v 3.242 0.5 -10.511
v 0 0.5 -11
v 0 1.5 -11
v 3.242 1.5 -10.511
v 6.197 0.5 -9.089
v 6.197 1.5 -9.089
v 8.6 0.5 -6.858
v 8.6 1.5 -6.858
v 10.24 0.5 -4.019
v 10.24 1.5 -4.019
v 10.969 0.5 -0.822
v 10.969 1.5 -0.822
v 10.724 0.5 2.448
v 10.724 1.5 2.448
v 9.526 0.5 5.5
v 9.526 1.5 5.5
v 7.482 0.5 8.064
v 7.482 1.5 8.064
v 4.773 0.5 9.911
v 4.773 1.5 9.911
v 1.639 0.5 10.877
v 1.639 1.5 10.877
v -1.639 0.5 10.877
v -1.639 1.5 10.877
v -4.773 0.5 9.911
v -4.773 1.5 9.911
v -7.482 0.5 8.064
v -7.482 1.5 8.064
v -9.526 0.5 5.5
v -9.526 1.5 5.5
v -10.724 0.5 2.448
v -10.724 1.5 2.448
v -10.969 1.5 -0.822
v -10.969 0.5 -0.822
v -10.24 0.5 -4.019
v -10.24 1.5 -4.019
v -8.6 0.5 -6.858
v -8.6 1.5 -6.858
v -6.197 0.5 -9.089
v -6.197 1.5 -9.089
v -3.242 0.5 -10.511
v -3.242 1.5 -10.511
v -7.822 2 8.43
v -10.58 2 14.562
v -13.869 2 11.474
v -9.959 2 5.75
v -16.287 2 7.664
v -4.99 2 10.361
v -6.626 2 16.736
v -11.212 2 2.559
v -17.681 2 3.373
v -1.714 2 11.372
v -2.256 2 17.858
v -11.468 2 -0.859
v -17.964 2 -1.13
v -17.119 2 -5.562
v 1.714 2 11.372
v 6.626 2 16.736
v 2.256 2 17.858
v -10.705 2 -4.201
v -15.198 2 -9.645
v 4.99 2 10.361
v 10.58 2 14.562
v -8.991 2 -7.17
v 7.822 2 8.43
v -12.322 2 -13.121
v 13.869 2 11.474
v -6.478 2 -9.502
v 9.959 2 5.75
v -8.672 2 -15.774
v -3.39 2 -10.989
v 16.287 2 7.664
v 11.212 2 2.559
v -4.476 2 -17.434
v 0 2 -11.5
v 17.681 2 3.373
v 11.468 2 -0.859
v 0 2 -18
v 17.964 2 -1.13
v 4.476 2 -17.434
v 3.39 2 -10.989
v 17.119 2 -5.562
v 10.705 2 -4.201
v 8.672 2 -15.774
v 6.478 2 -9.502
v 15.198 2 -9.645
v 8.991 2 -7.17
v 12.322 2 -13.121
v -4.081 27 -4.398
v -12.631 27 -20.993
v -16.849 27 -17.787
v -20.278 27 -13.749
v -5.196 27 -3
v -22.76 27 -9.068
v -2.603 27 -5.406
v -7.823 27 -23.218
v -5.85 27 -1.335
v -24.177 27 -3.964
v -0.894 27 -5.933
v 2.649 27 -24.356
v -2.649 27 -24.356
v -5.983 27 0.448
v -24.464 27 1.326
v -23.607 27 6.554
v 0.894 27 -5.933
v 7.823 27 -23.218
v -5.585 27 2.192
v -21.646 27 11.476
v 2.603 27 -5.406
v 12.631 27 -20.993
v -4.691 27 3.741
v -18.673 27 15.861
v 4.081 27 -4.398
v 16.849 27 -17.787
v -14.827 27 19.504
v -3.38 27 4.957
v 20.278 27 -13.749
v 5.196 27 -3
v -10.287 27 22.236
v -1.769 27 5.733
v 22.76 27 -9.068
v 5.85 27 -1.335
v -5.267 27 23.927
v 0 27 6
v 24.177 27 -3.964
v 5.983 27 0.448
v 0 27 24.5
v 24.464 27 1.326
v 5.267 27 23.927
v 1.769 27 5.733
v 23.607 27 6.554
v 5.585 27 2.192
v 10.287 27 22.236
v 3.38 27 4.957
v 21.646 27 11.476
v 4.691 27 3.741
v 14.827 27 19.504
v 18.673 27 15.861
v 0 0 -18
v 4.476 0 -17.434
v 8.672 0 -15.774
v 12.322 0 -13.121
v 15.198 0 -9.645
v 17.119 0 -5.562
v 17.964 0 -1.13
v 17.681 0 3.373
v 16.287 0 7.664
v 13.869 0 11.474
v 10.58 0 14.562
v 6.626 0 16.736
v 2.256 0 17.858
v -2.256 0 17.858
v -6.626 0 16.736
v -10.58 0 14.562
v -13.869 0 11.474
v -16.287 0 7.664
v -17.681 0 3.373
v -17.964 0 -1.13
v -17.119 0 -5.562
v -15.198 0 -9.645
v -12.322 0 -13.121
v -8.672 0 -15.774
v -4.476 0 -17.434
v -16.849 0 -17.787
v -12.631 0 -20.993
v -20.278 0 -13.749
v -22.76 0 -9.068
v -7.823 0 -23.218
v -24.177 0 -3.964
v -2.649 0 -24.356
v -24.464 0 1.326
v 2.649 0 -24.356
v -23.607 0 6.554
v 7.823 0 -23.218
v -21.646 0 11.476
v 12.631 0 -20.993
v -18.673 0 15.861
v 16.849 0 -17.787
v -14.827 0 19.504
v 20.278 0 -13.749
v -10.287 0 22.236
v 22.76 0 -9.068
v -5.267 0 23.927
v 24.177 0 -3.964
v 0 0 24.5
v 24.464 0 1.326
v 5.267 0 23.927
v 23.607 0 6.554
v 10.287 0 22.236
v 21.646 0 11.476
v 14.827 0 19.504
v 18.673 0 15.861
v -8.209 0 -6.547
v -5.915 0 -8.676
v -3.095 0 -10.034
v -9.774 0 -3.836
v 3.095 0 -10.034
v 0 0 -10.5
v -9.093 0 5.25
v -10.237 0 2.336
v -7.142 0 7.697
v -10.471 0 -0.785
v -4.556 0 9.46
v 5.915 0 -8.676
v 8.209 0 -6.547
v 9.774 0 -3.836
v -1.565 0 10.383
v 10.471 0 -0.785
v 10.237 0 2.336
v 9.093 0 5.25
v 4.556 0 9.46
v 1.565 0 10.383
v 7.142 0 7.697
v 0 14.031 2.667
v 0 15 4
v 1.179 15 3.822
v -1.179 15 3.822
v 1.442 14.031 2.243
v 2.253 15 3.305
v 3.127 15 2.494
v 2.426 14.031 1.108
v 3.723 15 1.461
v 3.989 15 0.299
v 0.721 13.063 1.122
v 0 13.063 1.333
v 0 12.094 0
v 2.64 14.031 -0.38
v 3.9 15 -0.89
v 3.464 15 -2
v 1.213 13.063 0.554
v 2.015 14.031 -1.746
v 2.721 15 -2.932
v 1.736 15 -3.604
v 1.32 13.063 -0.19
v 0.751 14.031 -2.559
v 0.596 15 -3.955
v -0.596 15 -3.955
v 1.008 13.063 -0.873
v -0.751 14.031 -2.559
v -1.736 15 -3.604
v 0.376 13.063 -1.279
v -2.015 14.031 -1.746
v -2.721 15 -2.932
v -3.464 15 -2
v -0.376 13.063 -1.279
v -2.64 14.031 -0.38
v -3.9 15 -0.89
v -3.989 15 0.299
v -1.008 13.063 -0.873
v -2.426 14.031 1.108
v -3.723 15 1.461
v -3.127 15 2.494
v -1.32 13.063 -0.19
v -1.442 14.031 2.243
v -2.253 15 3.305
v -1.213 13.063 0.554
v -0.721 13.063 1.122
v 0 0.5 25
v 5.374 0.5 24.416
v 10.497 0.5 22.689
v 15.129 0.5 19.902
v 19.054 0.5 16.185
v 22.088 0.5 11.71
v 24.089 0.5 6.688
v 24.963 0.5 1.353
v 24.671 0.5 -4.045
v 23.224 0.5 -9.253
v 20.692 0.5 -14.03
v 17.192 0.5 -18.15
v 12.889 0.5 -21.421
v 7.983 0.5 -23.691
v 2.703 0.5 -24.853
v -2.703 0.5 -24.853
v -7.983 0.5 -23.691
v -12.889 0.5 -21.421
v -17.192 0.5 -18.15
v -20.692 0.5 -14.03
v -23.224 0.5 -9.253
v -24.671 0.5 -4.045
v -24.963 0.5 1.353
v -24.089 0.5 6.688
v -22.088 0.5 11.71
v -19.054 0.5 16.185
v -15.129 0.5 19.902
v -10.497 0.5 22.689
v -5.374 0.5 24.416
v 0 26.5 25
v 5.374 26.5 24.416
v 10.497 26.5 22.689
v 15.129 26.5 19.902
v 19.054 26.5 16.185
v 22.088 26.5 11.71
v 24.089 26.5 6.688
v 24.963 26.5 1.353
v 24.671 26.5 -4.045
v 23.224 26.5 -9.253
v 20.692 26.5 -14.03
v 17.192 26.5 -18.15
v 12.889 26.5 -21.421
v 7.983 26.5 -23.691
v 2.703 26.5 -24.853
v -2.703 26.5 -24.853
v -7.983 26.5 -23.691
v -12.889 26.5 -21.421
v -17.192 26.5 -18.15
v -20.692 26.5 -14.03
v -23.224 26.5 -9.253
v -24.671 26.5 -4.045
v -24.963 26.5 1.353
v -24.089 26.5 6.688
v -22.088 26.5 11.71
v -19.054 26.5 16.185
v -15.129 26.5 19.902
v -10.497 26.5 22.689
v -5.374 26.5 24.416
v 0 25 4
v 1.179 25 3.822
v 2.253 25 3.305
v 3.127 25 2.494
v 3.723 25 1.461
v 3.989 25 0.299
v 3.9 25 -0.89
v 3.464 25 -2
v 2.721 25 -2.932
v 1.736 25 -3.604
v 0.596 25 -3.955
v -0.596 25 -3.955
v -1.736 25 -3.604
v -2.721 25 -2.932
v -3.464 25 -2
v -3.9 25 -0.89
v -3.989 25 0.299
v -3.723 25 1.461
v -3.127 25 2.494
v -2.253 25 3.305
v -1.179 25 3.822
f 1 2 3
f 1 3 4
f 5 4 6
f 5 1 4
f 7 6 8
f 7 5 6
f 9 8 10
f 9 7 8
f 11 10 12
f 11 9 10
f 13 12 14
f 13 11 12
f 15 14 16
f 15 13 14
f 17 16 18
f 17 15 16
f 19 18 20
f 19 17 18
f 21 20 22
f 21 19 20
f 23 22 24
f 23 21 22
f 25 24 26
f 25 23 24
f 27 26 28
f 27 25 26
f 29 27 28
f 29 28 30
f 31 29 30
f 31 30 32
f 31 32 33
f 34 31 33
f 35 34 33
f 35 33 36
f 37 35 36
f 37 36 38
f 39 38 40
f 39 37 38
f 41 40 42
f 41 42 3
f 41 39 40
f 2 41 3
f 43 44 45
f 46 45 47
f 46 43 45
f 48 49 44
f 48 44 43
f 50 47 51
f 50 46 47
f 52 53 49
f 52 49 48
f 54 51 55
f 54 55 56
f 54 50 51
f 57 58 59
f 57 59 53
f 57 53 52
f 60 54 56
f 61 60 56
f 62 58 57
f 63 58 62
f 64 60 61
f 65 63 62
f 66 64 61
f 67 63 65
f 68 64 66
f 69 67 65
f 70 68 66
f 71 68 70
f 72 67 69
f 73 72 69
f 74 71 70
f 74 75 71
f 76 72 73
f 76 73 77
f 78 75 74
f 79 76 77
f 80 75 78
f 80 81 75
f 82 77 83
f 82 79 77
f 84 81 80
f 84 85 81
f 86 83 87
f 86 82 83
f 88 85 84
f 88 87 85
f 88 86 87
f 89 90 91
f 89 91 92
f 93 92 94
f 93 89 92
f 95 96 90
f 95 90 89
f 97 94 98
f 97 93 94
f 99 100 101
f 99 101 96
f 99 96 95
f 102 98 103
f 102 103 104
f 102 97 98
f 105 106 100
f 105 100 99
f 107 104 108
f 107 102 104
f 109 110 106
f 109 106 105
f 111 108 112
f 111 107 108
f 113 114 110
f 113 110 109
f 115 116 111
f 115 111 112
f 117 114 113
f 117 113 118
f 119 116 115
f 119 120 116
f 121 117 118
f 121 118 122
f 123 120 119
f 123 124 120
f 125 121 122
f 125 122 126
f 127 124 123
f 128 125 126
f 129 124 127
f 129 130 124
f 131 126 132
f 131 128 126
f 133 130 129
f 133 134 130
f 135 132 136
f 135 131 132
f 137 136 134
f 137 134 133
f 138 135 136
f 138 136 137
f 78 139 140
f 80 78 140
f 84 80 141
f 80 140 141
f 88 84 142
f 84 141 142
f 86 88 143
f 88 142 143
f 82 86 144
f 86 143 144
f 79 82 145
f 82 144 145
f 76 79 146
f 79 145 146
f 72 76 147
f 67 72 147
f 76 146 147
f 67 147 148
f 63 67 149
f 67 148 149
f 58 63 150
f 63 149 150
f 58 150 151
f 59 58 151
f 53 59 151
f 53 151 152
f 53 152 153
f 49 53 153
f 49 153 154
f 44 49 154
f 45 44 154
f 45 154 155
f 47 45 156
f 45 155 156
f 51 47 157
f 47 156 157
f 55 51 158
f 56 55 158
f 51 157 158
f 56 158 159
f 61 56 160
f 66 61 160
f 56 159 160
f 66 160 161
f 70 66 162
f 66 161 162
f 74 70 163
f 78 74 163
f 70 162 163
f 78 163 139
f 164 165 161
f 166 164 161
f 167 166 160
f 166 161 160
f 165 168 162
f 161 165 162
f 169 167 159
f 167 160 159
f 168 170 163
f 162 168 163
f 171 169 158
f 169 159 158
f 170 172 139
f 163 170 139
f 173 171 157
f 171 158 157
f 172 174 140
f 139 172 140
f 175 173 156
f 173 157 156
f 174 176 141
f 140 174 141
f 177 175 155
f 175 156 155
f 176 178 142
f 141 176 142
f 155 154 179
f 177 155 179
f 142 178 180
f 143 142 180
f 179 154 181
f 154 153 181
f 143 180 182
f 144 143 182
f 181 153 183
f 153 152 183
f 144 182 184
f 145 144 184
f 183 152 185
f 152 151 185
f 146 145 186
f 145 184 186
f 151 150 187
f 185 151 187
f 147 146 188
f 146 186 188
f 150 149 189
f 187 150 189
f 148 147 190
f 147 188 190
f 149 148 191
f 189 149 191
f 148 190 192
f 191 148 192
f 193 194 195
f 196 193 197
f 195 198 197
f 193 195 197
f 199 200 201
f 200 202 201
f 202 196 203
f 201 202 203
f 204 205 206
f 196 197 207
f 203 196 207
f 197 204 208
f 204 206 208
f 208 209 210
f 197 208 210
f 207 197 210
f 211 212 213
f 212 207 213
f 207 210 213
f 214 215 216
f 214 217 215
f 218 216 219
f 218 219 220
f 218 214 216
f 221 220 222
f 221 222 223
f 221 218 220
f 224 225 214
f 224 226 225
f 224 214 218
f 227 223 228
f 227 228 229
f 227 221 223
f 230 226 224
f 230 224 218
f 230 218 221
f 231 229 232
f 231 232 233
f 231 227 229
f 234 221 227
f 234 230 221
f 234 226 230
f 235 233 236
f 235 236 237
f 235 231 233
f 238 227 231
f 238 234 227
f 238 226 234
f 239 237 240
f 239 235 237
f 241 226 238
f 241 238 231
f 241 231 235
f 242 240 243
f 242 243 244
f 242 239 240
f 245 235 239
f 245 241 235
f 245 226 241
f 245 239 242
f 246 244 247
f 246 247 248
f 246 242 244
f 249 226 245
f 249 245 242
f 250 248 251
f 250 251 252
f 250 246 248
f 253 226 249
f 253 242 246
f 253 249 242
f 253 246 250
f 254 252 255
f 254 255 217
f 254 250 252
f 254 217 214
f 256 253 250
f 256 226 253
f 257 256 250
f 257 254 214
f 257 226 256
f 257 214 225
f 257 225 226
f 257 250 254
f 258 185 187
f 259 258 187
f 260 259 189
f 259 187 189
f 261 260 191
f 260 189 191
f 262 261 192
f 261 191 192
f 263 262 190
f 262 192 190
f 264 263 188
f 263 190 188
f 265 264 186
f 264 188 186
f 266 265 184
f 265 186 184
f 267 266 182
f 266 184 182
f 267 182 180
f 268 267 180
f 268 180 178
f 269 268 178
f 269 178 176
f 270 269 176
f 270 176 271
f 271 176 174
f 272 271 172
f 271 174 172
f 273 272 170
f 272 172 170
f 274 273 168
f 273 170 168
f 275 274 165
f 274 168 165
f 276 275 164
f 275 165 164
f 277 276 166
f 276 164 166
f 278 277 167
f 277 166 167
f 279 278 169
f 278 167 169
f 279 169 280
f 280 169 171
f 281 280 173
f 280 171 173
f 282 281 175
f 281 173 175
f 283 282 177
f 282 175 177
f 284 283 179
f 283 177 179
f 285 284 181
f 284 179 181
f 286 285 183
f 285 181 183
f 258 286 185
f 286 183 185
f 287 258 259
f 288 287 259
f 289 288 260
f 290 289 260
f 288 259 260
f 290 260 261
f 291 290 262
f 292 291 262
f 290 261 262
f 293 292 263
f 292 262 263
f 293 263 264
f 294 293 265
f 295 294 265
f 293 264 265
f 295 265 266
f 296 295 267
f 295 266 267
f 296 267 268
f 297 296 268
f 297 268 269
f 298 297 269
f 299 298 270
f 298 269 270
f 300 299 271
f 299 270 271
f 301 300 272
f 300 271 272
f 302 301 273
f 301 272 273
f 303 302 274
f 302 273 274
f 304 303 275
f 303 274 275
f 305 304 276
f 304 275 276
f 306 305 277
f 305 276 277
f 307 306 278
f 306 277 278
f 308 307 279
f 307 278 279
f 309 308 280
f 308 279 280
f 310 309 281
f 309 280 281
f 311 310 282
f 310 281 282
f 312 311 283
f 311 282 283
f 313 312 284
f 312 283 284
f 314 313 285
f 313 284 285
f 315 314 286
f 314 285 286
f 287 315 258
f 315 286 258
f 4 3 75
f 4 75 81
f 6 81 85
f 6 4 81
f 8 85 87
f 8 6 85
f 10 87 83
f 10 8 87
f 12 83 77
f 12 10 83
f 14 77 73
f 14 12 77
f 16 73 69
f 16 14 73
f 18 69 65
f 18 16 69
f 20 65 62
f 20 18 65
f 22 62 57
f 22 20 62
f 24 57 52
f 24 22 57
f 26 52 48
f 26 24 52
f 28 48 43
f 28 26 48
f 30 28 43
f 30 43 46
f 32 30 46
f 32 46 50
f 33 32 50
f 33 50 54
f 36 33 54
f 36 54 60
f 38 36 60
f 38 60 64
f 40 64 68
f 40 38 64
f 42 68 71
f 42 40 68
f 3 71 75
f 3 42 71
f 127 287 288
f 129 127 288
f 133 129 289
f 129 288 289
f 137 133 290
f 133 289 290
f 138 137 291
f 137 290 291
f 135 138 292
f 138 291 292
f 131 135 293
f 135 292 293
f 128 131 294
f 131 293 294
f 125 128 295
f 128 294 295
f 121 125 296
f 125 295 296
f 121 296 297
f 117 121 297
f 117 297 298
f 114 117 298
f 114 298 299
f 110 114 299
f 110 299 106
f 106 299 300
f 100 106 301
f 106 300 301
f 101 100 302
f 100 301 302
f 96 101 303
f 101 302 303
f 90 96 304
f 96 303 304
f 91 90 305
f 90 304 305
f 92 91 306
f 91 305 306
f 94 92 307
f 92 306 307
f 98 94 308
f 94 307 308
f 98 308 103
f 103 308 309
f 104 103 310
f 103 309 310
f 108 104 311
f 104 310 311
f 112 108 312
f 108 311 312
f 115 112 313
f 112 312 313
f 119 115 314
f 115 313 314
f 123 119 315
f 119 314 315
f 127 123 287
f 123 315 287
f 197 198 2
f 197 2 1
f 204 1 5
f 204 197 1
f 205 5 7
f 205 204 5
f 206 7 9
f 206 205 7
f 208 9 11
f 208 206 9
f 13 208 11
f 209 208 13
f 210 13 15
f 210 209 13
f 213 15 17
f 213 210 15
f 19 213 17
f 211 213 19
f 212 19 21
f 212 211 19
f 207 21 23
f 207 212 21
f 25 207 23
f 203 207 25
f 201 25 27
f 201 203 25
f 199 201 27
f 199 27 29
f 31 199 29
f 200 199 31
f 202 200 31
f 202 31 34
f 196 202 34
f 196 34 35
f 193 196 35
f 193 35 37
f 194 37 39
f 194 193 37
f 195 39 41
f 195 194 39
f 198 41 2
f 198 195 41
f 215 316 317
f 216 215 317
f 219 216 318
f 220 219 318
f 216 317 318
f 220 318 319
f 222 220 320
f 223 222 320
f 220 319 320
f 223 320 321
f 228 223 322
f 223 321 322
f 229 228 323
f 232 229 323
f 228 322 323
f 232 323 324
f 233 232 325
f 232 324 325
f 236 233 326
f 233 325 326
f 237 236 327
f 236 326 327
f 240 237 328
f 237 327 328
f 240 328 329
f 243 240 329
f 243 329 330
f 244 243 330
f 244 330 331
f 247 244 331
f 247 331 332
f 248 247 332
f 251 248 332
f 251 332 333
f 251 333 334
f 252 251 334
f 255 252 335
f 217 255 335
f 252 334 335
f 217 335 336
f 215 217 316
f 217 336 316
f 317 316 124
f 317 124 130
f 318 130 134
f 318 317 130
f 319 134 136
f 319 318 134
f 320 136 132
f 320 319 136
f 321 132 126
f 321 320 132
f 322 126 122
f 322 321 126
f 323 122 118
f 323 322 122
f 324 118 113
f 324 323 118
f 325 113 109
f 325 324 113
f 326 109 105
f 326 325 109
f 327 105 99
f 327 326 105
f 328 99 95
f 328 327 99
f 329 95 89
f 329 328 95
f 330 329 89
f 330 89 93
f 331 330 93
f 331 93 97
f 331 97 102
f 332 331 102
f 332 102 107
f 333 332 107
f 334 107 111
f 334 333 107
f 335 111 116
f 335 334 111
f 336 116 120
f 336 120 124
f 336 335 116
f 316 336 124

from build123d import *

# Parameters (mm, degrees)
SKETCH_1_R          = 25
EXTRUDE_1_DEPTH     = 27
SKETCH_9_R          = 4
CUT_EXTRUDE_1_DEPTH = 12
CHAMFER_1_SIZE      = 2
CHAMFER_2_SIZE      = 0.5
SKETCH_11_R         = 18
SKETCH_11_R_2       = 11
CUT_EXTRUDE_2_DEPTH = 2
CHAMFER_3_SIZE      = 0.5


with BuildPart() as part:
    # 草图1 → 凸台-拉伸1 (new body)
    with BuildSketch(Plane(origin=(0, 0, 0), x_dir=(1, 0, 0), z_dir=(0, 1, 0))):
        with Locations(Location((0, 0, 0), (0, 0, 270))):
            Circle(SKETCH_1_R)
    extrude(amount=EXTRUDE_1_DEPTH)

    # 草图9 → 切除-拉伸1 (cut)
    with BuildSketch(Plane(origin=(0, 27, 0), x_dir=(1, 0, 0), z_dir=(0, 1, 0))):
        with Locations(Location((0, 0, 0), (0, 0, 270))):
            Circle(SKETCH_9_R)
    extrude(amount=-CUT_EXTRUDE_1_DEPTH, mode=Mode.SUBTRACT)

    # 草图10 → 切除-旋转2 (revolve, cut)
    with BuildSketch(Plane.XY, mode=Mode.PRIVATE) as cut_revolve_2_sk:
        Polygon((-4, 15), (0, 12.093829888), (0, 15), align=None)
    revolve(cut_revolve_2_sk.sketch.rotate(Axis((0, 12.093829888, 0), (0, 1, 0)), 90), axis=Axis((0, 12.093829888, 0), (0, 1, 0)), mode=Mode.SUBTRACT)

    # 倒角1
    chamfer_1_edges = [part.edges().sort_by_distance(p)[0] for p in [
        (0, 27, -4),
    ]]
    chamfer(chamfer_1_edges, length=CHAMFER_1_SIZE)

    # 倒角2
    chamfer_2_edges = [part.edges().sort_by_distance(p)[0] for p in [
        (0, 0, -25),
        (0, 27, -25),
    ]]
    chamfer(chamfer_2_edges, length=CHAMFER_2_SIZE)

    # 草图11 → 切除-拉伸2 (cut)
    with BuildSketch(Plane.XZ):
        with Locations(Location((0, 0, 0), (0, 0, 270))):
            Circle(SKETCH_11_R)
        with Locations(Location((0, 0, 0), (0, 0, 270))):
            Circle(SKETCH_11_R_2, mode=Mode.SUBTRACT)
    extrude(amount=-CUT_EXTRUDE_2_DEPTH, mode=Mode.SUBTRACT)

    # 倒角3
    chamfer_3_edges = [part.edges().sort_by_distance(p)[0] for p in [
        (0, 2, 11),
        (0, 0, 11),
    ]]
    chamfer(chamfer_3_edges, length=CHAMFER_3_SIZE)


solid = part.part
